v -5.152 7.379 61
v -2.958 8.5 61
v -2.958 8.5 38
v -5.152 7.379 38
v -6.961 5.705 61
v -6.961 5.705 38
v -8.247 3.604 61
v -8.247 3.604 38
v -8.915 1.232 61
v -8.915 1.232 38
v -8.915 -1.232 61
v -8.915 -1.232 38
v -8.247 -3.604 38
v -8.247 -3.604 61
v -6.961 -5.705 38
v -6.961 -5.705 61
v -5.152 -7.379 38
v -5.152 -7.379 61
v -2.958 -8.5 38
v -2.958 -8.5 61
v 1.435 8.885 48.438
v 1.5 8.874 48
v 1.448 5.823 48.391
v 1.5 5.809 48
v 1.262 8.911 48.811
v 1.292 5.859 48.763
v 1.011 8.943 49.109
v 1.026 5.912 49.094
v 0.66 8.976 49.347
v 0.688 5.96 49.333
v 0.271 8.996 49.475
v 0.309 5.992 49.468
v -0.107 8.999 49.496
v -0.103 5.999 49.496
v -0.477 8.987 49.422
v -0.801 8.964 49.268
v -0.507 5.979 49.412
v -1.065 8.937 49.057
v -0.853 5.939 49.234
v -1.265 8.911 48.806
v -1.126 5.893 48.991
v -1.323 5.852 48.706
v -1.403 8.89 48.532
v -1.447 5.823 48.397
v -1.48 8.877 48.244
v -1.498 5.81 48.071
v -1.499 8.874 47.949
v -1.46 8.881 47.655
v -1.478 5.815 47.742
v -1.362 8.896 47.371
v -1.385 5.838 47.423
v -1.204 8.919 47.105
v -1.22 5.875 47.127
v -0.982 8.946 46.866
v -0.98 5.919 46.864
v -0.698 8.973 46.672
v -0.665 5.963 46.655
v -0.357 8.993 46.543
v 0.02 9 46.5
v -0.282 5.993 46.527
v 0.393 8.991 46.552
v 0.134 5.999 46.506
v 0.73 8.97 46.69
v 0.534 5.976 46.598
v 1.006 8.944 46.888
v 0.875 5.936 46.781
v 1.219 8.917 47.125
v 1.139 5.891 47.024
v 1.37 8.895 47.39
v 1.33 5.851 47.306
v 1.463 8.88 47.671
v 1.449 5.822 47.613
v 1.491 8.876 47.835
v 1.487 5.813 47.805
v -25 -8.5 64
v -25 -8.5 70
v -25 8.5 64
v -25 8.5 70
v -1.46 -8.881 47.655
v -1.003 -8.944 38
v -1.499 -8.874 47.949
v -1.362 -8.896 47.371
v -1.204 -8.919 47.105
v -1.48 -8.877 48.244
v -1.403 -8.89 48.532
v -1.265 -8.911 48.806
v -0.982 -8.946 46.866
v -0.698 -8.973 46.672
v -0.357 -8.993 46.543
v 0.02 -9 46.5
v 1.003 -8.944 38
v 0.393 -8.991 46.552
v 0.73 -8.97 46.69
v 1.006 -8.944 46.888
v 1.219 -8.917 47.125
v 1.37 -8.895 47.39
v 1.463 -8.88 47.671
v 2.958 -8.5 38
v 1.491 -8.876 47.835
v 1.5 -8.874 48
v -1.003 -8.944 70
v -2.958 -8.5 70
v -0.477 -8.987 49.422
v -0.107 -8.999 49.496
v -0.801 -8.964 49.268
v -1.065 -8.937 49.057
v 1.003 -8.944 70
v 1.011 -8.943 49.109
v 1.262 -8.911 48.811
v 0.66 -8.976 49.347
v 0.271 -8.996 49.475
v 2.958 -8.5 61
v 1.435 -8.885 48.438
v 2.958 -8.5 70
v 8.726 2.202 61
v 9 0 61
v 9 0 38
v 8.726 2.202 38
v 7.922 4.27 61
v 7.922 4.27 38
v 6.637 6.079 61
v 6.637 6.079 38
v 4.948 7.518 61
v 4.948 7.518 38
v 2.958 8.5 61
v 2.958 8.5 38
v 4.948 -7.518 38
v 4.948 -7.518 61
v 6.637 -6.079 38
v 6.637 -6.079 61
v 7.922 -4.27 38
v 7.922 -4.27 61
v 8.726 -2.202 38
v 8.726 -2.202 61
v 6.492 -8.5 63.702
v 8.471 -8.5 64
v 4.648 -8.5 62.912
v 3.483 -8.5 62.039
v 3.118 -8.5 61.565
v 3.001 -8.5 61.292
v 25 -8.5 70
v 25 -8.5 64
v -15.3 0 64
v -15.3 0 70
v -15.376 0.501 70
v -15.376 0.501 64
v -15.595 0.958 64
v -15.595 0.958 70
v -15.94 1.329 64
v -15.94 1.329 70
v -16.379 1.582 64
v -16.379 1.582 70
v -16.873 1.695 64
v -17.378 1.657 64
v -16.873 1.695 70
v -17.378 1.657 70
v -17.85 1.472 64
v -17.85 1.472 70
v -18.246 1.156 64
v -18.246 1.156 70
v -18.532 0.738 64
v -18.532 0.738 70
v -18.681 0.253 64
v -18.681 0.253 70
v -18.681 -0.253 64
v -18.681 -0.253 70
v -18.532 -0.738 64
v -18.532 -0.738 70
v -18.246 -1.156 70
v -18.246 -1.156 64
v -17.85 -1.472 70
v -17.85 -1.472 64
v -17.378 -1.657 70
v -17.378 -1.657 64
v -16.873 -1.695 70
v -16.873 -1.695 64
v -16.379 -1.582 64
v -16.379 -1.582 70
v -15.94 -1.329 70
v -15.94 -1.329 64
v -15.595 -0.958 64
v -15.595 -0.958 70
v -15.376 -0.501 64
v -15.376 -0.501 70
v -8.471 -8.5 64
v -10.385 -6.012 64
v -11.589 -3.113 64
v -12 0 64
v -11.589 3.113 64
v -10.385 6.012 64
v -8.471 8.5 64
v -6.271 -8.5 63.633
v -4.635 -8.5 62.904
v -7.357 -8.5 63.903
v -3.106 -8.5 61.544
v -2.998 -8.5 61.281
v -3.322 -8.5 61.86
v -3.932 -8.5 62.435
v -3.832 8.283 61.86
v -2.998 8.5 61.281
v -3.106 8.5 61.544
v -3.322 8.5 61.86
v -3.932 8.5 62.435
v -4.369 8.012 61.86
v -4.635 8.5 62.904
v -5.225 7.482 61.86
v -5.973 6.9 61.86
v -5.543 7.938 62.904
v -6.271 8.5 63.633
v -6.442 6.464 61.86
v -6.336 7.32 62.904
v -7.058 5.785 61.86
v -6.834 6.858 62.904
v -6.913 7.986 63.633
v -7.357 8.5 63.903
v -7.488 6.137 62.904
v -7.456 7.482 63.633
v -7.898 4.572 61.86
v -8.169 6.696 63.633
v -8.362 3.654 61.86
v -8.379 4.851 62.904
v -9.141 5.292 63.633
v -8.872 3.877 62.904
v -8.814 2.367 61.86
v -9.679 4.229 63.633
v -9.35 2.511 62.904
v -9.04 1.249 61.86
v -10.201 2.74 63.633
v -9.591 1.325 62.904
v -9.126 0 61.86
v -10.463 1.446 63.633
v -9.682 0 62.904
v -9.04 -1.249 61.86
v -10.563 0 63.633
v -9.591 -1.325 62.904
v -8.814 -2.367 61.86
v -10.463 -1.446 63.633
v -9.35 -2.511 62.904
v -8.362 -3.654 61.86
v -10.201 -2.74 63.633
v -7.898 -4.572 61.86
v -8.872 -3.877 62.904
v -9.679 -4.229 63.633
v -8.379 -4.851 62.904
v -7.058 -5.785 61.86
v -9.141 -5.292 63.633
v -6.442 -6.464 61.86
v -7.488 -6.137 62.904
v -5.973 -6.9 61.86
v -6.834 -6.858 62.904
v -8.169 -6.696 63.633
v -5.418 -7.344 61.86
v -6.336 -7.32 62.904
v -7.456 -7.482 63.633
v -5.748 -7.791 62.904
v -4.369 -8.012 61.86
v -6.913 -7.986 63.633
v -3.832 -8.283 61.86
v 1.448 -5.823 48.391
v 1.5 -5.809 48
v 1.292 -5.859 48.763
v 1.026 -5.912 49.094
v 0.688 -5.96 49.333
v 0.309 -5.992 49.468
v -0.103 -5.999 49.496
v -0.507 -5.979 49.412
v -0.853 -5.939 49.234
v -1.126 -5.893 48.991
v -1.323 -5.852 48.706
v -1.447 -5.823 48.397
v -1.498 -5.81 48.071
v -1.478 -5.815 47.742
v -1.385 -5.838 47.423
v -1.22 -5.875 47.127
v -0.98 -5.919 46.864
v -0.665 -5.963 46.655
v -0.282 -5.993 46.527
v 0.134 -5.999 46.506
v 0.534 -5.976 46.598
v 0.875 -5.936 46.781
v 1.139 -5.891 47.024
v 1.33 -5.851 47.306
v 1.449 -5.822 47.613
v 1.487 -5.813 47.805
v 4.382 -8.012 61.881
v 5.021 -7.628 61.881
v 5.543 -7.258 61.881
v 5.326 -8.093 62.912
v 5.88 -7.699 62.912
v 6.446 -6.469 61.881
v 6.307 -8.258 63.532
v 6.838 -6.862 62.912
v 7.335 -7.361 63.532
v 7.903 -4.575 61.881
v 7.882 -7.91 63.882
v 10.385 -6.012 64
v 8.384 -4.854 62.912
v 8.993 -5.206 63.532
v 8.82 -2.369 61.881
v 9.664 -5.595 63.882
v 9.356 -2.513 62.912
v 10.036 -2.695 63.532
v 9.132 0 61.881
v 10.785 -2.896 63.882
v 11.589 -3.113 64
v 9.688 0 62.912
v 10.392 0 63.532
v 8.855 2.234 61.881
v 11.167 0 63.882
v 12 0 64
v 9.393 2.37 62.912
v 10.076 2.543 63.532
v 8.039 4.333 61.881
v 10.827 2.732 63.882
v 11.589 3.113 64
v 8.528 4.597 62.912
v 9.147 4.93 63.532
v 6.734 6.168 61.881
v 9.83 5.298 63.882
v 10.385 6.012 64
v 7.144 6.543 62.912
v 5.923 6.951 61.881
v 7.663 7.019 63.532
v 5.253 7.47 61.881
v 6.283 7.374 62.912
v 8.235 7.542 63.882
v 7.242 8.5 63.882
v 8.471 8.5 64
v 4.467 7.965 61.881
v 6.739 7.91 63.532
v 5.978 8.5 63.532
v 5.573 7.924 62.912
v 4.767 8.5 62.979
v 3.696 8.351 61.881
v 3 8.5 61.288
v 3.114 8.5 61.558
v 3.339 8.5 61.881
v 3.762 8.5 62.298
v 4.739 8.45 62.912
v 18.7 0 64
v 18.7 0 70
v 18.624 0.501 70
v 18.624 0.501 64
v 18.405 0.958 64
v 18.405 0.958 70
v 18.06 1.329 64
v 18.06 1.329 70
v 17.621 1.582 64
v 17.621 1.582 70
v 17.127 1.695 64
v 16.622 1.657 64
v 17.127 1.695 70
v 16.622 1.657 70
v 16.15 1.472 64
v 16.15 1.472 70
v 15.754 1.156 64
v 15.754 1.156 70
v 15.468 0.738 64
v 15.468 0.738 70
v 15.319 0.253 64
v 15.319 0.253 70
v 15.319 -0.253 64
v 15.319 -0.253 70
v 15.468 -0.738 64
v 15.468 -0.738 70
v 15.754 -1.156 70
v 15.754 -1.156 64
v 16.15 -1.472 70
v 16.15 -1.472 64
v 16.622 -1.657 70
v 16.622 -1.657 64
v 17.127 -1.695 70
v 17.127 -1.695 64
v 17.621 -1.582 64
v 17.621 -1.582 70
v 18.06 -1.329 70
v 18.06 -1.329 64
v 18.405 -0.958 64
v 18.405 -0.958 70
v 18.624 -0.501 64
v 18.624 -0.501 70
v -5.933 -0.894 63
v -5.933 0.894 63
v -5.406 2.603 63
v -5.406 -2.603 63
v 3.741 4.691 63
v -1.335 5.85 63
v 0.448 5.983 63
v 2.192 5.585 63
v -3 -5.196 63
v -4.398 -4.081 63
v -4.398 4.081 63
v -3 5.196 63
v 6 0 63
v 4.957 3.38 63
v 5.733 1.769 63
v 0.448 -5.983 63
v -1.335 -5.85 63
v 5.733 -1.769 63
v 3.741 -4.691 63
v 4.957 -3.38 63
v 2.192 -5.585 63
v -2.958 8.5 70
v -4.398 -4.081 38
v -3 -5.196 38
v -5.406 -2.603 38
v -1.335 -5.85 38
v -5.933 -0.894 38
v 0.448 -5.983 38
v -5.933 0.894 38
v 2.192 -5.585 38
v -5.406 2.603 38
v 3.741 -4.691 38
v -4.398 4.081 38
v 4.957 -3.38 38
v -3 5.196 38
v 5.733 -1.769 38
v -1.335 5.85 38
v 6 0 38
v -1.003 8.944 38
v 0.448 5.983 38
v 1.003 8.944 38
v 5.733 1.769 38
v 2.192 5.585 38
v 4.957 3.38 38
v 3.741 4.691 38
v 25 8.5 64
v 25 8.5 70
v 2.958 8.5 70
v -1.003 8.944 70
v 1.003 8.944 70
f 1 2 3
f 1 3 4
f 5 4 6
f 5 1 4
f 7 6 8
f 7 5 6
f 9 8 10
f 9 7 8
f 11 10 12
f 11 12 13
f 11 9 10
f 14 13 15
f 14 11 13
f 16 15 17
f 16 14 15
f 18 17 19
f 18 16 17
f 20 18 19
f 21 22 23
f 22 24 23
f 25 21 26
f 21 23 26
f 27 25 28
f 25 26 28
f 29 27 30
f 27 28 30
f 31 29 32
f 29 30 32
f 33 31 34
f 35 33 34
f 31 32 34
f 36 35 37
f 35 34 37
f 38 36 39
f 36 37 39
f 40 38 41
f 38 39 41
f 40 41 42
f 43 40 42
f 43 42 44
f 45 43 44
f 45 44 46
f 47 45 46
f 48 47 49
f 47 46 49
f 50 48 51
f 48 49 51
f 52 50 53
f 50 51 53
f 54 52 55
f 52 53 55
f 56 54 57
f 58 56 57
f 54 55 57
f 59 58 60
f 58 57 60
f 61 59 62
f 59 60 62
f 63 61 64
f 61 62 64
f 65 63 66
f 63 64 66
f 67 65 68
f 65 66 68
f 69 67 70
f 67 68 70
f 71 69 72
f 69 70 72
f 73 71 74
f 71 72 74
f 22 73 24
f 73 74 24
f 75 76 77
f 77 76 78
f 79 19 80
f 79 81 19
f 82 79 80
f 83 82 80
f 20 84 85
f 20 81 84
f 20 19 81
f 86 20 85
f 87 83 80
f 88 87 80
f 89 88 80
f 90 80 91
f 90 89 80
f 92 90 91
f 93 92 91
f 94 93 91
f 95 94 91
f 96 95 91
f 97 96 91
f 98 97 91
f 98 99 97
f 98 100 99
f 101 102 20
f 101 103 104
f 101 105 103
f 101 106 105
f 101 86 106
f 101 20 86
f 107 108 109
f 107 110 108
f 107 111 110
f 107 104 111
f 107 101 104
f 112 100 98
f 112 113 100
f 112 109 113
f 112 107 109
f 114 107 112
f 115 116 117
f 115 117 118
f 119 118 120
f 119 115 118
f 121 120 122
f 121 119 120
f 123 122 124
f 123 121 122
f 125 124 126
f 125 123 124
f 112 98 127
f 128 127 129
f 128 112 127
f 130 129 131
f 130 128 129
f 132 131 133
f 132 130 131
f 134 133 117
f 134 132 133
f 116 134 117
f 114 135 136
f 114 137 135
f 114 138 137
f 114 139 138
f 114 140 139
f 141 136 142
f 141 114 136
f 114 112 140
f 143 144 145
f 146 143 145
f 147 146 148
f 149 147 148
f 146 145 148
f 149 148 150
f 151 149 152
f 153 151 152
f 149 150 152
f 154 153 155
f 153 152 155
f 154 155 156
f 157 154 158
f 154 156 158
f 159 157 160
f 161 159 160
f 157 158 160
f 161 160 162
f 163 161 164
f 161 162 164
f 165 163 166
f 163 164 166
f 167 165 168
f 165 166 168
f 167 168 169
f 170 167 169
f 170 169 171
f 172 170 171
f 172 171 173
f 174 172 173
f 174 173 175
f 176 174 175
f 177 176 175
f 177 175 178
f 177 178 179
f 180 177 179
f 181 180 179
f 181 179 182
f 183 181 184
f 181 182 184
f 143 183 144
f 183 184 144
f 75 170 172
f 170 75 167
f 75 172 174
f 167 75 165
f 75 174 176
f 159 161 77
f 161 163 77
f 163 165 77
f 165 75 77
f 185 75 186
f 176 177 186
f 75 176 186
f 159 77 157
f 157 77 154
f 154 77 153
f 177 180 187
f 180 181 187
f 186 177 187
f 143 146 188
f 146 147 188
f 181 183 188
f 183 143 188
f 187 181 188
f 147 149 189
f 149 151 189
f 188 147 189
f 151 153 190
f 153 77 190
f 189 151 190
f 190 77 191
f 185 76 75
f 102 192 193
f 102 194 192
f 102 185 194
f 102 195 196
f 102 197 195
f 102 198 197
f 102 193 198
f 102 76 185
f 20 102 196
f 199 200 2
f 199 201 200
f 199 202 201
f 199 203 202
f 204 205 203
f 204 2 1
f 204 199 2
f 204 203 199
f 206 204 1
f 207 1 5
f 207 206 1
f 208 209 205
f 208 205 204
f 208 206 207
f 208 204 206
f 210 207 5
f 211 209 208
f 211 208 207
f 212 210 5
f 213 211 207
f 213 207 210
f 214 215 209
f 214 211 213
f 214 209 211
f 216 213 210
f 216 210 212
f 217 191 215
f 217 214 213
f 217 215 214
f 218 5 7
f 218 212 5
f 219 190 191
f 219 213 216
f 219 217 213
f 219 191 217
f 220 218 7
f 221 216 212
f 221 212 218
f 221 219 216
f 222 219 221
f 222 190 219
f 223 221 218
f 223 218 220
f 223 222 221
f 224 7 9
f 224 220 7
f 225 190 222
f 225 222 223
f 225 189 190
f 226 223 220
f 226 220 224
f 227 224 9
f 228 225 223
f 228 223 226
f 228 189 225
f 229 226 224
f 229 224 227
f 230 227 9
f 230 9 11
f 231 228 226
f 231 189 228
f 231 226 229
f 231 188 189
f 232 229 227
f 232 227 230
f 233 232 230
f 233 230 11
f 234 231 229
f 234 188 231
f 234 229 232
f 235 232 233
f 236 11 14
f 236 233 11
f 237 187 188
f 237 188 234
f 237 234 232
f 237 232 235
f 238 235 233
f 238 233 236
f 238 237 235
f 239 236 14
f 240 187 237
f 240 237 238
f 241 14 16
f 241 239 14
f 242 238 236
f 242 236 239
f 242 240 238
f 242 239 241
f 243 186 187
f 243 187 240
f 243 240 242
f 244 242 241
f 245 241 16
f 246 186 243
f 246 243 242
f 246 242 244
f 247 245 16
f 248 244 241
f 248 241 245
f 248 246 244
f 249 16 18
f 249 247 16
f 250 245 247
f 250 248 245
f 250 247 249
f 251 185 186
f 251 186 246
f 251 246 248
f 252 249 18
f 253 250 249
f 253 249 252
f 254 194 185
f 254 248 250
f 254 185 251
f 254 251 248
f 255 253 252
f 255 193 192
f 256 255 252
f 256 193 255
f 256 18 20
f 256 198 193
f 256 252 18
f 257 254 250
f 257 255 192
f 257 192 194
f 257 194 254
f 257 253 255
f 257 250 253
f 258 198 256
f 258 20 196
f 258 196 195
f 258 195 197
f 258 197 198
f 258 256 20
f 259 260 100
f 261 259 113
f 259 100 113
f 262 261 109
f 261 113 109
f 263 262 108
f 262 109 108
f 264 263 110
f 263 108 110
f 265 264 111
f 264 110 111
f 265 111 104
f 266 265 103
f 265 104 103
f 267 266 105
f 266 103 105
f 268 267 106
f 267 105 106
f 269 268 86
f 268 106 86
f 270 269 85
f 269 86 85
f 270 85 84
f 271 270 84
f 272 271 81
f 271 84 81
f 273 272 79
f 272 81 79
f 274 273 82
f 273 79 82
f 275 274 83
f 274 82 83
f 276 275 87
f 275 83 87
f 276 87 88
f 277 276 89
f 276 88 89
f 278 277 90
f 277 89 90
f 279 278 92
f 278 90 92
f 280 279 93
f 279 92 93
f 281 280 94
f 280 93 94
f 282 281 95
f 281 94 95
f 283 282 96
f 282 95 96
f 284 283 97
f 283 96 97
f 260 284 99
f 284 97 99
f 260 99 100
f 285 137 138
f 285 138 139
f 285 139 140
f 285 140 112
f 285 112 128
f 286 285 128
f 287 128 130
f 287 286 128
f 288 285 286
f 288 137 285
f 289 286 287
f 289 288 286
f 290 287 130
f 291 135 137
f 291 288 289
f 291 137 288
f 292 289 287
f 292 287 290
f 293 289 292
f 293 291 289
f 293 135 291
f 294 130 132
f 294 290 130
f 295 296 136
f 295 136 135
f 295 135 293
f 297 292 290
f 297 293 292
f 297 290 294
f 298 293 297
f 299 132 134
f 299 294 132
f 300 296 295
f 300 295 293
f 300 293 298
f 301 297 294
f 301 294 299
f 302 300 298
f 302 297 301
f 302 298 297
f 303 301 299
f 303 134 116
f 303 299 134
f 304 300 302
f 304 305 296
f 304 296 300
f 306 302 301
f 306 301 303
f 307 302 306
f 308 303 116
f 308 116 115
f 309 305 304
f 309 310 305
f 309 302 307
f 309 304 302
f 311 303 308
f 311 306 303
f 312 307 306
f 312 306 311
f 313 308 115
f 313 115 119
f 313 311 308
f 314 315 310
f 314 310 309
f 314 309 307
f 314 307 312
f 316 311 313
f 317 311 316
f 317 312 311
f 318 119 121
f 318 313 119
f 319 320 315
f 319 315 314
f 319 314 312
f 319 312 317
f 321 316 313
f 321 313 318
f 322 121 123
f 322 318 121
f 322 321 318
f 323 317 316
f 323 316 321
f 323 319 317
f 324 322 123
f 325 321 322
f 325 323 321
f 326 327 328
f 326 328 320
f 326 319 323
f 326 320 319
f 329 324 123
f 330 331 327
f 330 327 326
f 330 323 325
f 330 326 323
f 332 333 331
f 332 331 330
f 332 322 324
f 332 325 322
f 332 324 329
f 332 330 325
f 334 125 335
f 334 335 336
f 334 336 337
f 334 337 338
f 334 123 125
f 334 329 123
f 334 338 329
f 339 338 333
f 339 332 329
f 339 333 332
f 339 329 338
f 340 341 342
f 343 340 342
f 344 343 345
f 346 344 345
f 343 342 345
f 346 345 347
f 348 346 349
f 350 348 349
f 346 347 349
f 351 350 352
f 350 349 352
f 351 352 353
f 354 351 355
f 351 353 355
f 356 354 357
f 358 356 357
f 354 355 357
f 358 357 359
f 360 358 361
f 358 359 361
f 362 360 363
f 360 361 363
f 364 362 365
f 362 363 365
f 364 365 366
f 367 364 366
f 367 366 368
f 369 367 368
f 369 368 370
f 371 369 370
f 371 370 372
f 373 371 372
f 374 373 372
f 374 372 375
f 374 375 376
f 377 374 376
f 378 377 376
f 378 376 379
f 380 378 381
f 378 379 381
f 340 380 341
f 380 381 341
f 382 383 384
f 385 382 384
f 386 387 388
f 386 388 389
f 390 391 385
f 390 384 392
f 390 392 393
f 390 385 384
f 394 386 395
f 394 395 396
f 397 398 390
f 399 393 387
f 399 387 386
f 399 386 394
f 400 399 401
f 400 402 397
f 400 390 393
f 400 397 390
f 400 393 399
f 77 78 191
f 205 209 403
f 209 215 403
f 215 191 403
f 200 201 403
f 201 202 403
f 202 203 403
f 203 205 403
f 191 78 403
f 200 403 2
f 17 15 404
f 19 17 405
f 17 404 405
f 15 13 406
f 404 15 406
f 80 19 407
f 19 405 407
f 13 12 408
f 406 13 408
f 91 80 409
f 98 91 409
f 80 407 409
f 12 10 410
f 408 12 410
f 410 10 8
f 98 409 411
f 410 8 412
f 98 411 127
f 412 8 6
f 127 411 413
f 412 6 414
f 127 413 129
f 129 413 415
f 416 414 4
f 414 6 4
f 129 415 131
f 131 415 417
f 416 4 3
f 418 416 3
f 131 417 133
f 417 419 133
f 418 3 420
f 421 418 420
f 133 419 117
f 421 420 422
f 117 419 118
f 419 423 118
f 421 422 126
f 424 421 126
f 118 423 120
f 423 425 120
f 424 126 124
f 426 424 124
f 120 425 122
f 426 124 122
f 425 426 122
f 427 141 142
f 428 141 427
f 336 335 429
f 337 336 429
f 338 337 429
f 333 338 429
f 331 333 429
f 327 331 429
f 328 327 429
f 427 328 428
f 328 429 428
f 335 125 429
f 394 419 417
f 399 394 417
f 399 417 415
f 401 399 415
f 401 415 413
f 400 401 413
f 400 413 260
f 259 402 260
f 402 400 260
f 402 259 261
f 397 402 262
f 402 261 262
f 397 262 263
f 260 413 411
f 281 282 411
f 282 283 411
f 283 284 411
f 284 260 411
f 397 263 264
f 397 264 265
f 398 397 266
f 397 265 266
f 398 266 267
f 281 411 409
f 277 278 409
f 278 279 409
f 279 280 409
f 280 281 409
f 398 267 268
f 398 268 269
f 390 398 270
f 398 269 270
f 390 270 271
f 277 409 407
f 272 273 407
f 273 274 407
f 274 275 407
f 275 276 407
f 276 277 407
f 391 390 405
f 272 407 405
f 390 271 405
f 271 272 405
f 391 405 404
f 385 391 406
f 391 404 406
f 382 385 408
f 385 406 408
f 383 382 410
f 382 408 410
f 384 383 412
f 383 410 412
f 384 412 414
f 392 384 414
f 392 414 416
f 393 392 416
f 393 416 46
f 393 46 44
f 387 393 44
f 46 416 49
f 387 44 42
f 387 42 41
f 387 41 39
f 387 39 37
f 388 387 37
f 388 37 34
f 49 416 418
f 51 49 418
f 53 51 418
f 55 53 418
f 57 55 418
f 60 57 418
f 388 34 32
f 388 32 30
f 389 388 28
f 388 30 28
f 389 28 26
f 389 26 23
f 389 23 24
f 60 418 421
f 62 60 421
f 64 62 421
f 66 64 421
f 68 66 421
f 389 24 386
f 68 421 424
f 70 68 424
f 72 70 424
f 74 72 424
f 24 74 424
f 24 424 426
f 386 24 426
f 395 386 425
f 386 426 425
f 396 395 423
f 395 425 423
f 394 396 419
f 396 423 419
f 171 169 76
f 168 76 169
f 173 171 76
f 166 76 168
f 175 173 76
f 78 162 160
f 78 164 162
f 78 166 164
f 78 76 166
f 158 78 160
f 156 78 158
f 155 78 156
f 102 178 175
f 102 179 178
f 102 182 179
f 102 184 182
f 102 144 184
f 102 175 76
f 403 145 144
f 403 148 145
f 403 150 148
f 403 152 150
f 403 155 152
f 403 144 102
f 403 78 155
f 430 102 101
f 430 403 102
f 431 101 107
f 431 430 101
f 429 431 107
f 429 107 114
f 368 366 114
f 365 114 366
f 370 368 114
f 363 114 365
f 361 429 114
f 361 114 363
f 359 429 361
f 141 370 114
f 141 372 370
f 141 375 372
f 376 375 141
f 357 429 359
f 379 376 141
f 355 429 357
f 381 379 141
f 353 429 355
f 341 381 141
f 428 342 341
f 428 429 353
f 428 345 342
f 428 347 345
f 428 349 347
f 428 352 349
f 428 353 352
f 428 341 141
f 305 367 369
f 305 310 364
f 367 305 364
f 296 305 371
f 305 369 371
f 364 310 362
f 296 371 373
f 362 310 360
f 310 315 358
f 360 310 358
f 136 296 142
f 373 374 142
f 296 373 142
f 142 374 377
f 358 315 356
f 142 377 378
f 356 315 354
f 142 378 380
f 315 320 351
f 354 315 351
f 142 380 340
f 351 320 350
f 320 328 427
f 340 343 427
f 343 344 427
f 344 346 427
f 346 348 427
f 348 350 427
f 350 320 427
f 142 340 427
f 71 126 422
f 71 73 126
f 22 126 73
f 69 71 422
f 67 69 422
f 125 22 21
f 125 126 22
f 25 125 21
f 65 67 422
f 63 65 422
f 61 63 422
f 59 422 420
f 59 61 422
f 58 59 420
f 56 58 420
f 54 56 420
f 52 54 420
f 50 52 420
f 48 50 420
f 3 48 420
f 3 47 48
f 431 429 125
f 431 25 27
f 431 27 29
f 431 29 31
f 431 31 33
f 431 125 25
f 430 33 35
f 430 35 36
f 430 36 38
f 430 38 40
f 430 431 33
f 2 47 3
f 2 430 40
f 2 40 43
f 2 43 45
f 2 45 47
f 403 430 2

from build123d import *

# Parameters (mm, degrees)
F1_W         = 50
F1_H         = 17
F1_R         = 1.7
F2_DEPTH     = 6
F4_DEPTH     = 32
F5_T4_ANGLE  = 237.2117204573
F5_T10_ANGLE = 237.2117204573
F6_R         = 6
F7_DEPTH     = 25
F8_R         = 1.5
F9_DEPTH     = 15.2


# Not quite as in the source:
# - a fillet or chamfer that OpenCascade refuses, or shapes differently, is made with other operations: its cross-section is extruded or revolved along the edge and cut away or added


with BuildPart() as f2:
    # F1 (on offset) → F2 (new body)
    with BuildSketch(Plane.XY.offset(70)):
        Rectangle(F1_W, F1_H)
        with Locations((-17, 0)):
            Circle(F1_R, mode=Mode.SUBTRACT)
        with Locations((17, 0)):
            Circle(F1_R, mode=Mode.SUBTRACT)
    extrude(amount=-F2_DEPTH)

    # F3 (on face) → F4 (join)
    with BuildSketch(Plane.XY.offset(70)):
        with BuildLine():
            ThreePointArc((2.9580398915, -8.5), (7.3356103708, -5.2142900272), (9, 0))
            ThreePointArc((9, 0), (7.3356103708, 5.2142900272), (2.9580398915, 8.5))
            Line((2.9580398915, 8.5), (-2.9580398916, 8.5))
            ThreePointArc((-2.9580398916, 8.5), (-9, 0), (-2.9580398916, -8.5))
            Line((-2.9580398916, -8.5), (2.9580398915, -8.5))
        make_face()
        with BuildLine():
            ThreePointArc((-2.9580398916, -8.5), (0, -9), (2.9580398915, -8.5))
            Line((2.9580398915, -8.5), (-2.9580398916, -8.5))
        make_face()
        with BuildLine():
            Line((-2.9580398916, 8.5), (2.9580398915, 8.5))
            ThreePointArc((2.9580398915, 8.5), (0, 9), (-2.9580398916, 8.5))
        make_face()
    extrude(amount=-F4_DEPTH)

    # F5: fillet of radius 3 on 2 edges, made by hand


with BuildPart() as f5_tool2:
    # F5_s3 → F5_t4 (revolve)
    with BuildSketch(Plane(origin=(0, 0, 0), x_dir=(0, 0, 1), z_dir=(-0.8779340101, 0.4787816558, 0))):
        with BuildLine():
            ThreePointArc((61, -9), (63.1213203436, -9.8786796564), (64, -12))
            Line((64, -12), (64, -9))
            Line((64, -9), (61, -9))
        make_face()
    revolve(axis=Axis((0, 0, 64), (0, 0, 1)), revolution_arc=F5_T4_ANGLE)

    split(bisect_by=Plane.XZ.offset(-8.5), keep=Keep.TOP)

    split(bisect_by=Plane.XZ.offset(8.5), keep=Keep.BOTTOM)


with BuildPart() as f2_1:
    add(f2.part)

    # F5_t1: union F5_tool2
    add(f5_tool2.part)


with BuildPart() as f5_tool8:
    # F5_s9 → F5_t10 (revolve)
    with BuildSketch(Plane(origin=(0, 0, 0), x_dir=(0, 0, 1), z_dir=(0.8779340101, -0.4787816558, 0))):
        with BuildLine():
            ThreePointArc((61, -9), (63.1213203436, -9.8786796564), (64, -12))
            Line((64, -12), (64, -9))
            Line((64, -9), (61, -9))
        make_face()
    revolve(axis=Axis((0, 0, 64), (0, 0, 1)), revolution_arc=F5_T10_ANGLE)

    split(bisect_by=Plane.XZ.offset(-8.5), keep=Keep.TOP)

    split(bisect_by=Plane.XZ.offset(8.5), keep=Keep.BOTTOM)


with BuildPart() as f2_2:
    add(f2_1.part)

    # F5_t7: union F5_tool8
    add(f5_tool8.part)

    # F6 (on face) → F7 (cut)
    with BuildSketch(Plane(origin=(0, 0, 38), x_dir=(1, 0, 0), z_dir=(0, 0, -1))):
        Circle(F6_R)
    extrude(amount=-F7_DEPTH, mode=Mode.SUBTRACT)

    # F8 (on Front) → F9 (cut, symmetric)
    with BuildSketch(Plane.XZ):
        with Locations((0, 48)):
            Circle(F8_R)
    extrude(amount=F9_DEPTH, both=True, mode=Mode.SUBTRACT)


solid = f2_2.part
